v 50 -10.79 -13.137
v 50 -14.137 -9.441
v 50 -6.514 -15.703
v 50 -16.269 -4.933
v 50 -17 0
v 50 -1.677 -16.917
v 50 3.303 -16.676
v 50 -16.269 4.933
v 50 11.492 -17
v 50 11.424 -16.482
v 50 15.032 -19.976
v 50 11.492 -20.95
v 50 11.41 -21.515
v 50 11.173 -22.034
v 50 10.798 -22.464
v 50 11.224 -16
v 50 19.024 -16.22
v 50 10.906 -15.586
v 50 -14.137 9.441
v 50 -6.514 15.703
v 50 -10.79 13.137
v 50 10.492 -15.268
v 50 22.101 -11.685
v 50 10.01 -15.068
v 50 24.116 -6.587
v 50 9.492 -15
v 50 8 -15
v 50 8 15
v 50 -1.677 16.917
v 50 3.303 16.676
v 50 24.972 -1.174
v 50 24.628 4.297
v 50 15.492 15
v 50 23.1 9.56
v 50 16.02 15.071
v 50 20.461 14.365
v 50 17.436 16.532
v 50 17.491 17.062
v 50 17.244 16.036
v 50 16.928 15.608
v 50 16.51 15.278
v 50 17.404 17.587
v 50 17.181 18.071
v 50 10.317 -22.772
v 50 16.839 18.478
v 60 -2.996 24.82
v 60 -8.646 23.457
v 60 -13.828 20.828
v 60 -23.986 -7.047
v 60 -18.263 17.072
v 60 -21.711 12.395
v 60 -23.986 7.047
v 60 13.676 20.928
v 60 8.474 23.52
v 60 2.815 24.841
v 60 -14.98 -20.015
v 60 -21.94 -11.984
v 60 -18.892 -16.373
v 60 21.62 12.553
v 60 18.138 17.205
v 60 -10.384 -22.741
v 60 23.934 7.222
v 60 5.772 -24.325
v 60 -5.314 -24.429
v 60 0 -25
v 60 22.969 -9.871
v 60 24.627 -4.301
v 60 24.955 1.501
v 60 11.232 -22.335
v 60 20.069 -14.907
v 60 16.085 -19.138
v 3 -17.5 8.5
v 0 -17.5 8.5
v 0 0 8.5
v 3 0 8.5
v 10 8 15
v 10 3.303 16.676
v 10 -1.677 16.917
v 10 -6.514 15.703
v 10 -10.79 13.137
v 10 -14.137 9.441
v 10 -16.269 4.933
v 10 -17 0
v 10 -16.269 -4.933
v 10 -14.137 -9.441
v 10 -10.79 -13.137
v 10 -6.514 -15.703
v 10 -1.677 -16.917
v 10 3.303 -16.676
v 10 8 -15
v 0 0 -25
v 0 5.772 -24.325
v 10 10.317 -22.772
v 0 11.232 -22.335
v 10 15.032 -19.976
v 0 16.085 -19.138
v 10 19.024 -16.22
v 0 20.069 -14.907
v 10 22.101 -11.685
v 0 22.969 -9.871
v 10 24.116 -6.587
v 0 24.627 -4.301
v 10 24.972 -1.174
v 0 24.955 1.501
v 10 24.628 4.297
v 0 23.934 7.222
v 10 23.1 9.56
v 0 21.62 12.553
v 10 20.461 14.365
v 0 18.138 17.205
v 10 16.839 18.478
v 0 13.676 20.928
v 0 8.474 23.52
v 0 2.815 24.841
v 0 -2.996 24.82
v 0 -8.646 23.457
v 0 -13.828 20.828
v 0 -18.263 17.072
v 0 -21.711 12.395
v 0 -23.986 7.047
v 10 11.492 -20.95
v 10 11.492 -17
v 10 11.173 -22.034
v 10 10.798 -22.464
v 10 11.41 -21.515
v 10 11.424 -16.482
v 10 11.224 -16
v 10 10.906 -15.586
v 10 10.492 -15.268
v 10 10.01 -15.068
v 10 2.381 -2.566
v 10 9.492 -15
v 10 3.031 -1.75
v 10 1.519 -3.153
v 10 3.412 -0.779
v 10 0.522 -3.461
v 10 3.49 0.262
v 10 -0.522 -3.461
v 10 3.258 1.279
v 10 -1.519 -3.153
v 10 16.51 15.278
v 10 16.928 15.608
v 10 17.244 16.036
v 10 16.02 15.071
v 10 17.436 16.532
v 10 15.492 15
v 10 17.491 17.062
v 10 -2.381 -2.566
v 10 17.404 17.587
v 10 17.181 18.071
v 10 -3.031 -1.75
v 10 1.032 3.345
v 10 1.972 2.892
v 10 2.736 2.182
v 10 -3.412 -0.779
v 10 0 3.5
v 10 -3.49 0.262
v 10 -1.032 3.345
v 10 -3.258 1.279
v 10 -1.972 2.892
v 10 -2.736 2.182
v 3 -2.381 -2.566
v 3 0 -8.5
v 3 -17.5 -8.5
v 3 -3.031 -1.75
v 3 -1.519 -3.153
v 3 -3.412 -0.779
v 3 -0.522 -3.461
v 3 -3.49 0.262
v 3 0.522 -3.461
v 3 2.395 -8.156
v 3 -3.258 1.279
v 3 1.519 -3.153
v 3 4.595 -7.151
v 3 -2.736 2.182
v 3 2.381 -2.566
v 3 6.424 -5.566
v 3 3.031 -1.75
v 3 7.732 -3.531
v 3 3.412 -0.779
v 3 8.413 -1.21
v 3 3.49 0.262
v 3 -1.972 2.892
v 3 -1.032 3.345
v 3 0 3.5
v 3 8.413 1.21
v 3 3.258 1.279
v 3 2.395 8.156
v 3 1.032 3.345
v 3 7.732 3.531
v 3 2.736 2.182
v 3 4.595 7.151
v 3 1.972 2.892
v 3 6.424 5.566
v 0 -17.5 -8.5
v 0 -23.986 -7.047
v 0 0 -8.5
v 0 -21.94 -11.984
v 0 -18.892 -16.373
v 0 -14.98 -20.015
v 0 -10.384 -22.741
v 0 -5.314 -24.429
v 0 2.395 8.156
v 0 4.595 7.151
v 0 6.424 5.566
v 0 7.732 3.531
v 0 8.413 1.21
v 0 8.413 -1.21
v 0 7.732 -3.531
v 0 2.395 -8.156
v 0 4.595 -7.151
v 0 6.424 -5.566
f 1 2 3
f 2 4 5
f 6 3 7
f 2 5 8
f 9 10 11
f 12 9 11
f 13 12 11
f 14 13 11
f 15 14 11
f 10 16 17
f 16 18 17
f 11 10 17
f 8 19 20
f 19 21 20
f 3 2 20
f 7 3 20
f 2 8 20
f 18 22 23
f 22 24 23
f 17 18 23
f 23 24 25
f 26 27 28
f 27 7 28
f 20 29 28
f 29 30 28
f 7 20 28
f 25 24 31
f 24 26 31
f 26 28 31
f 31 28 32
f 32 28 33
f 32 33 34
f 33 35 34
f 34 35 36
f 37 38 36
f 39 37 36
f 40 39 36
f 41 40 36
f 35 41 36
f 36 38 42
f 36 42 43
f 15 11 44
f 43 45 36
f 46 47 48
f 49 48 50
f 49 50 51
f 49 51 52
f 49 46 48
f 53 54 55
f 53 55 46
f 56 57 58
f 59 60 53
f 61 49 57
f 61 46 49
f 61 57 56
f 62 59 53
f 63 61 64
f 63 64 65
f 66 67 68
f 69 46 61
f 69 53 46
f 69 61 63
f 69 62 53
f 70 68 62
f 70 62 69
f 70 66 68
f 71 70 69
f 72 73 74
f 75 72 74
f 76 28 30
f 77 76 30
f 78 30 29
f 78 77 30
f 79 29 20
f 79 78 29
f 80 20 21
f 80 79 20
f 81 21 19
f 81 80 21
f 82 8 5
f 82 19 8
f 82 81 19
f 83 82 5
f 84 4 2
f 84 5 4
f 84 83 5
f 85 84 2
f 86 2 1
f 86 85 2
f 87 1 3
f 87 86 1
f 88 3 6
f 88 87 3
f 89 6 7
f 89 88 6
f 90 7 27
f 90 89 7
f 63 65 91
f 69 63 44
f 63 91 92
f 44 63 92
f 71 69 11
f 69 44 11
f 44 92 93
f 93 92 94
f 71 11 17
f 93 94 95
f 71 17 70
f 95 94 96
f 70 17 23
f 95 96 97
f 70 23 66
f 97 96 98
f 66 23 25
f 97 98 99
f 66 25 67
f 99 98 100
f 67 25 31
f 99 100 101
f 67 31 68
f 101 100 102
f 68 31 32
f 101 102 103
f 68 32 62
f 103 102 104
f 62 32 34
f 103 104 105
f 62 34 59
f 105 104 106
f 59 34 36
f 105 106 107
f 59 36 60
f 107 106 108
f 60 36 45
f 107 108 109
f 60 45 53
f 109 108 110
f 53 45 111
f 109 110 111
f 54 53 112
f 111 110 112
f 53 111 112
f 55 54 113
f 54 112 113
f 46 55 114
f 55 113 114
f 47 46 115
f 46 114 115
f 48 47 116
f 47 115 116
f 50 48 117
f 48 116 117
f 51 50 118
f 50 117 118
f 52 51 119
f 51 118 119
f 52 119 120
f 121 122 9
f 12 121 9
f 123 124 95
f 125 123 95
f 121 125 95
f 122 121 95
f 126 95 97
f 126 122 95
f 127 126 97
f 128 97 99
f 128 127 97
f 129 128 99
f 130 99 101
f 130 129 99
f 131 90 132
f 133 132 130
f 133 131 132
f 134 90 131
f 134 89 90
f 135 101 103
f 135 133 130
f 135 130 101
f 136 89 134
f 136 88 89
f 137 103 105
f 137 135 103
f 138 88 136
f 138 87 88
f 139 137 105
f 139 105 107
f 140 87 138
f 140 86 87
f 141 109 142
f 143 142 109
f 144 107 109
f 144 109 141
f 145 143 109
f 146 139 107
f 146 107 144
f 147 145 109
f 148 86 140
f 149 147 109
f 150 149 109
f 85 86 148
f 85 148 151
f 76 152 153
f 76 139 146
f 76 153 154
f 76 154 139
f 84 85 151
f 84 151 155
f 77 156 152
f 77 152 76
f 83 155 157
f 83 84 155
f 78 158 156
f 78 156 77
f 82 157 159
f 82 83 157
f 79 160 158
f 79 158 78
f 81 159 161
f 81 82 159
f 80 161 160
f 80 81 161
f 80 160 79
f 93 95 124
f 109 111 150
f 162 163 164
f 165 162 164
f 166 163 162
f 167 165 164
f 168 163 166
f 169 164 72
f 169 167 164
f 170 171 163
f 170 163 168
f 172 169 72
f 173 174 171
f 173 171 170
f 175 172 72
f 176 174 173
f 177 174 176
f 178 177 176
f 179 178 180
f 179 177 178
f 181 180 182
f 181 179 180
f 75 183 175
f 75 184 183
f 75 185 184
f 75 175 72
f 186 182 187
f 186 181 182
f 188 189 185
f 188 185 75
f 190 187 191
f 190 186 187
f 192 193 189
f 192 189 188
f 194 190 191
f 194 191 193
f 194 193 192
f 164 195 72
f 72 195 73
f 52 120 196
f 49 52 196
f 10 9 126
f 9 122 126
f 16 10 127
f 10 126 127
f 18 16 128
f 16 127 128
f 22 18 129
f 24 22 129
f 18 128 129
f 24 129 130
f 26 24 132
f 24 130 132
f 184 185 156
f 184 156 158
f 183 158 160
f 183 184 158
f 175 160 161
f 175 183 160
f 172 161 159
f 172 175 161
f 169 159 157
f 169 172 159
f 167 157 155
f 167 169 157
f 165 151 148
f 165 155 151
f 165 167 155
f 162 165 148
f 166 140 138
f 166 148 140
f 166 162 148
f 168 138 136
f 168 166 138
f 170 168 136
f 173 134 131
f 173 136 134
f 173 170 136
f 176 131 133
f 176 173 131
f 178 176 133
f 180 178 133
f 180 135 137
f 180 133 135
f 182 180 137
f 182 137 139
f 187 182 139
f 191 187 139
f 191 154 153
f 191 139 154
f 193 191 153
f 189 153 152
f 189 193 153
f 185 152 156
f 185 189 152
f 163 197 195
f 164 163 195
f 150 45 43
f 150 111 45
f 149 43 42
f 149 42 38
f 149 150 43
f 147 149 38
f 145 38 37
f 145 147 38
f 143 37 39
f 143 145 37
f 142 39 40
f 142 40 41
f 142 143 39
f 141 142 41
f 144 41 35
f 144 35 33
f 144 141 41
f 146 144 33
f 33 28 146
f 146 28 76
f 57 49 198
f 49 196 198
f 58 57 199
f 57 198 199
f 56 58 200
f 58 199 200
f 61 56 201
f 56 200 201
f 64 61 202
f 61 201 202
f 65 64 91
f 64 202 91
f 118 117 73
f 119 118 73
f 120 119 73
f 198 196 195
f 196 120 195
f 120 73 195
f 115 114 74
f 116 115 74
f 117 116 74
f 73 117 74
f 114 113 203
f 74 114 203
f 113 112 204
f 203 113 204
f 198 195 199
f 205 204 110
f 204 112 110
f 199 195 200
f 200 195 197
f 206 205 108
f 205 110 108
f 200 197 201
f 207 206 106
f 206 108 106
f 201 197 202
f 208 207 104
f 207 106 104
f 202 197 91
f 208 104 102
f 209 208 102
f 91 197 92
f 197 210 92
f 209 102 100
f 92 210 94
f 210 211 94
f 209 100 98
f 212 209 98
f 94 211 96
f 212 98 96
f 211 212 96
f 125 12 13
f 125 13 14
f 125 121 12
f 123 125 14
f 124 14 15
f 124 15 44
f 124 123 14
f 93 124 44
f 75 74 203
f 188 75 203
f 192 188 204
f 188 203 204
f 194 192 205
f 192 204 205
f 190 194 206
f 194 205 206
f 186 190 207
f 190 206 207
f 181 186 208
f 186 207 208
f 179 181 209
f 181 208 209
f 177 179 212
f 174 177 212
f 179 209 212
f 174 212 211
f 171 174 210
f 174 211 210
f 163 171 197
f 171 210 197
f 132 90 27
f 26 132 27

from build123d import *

# Parameters (mm, degrees)
SKETCH2_R               = 25
BOSS_EXTRUDE1_DEPTH     = 60
CUT_EXTRUDE3_DEPTH      = 30
CUT_EXTRUDE4_DEPTH      = 20
CUT_EXTRUDE4_DEPTH_BACK = 20
SKETCH5_R               = 17
FILLET3_R               = 2
SKETCH6_R               = 3.5
CUT_EXTRUDE5_DEPTH      = 20
CUT_EXTRUDE7_DEPTH      = 3
CUT_EXTRUDE8_DEPTH      = 70.641941386
SKETCH9_W               = 40
SKETCH9_H               = 6
CUT_EXTRUDE9_DEPTH      = 30
FILLET5_R               = 2


with BuildPart() as part:
    # Sketch2 → Boss-Extrude1 (new body)
    with BuildSketch(Plane(origin=(0, 0, 0), x_dir=(0, 0, -1), z_dir=(1, 0, 0))):
        Circle(SKETCH2_R)
    extrude(amount=BOSS_EXTRUDE1_DEPTH)

    # Sketch4 → Cut-Extrude3 (cut)
    with BuildSketch(Plane(origin=(0, 0, 0), x_dir=(1, 0, 0), z_dir=(0, 1, 0))):
        Polygon((10, 0), (10, 15), (50, 15), (50, -15), (10, -15), align=None)
    extrude(amount=CUT_EXTRUDE3_DEPTH, mode=Mode.SUBTRACT)

    # Sketch5 → Cut-Extrude4 (cut, two sides: drawn at the far end of the back side and taken through both)
    with BuildSketch(Plane(origin=(30, 0, 0), x_dir=(0, 0, -1), z_dir=(1, 0, 0)).offset(-CUT_EXTRUDE4_DEPTH_BACK)):
        Circle(SKETCH5_R)
    extrude(amount=CUT_EXTRUDE4_DEPTH + CUT_EXTRUDE4_DEPTH_BACK, mode=Mode.SUBTRACT)

    # Fillet3
    fillet3_edges = [part.edges().sort_by_distance(p)[0] for p in [
        (30, 20, -15),
        (30, 20, 15),
    ]]
    fillet(fillet3_edges, radius=FILLET3_R)

    # Sketch6 → Cut-Extrude5 (cut)
    with BuildSketch(Plane(origin=(0, 0, 0), x_dir=(0, 0, -1), z_dir=(1, 0, 0))):
        with Locations(Location((0, 0, 0), (0, 0, 180))):
            Circle(SKETCH6_R)
    extrude(amount=CUT_EXTRUDE5_DEPTH, mode=Mode.SUBTRACT)

    # Sketch7 → Cut-Extrude7 (cut)
    with BuildSketch(Plane(origin=(0, 0, 0), x_dir=(0, 0, -1), z_dir=(1, 0, 0))):
        with BuildLine():
            Line((-8.5, -0.449954403), (-8.5, 0))
            ThreePointArc((-8.5, 0), (0, 8.5), (8.5, 0))
            Line((8.5, 0), (8.5, -17.5))
            Line((8.5, -17.5), (-8.5, -17.5))
            Line((-8.5, -17.5), (-8.5, -0.449954403))
        make_face()
    extrude(amount=CUT_EXTRUDE7_DEPTH, mode=Mode.SUBTRACT)

    # Sketch8 → Cut-Extrude8 (cut, through all)
    with BuildSketch(Plane(origin=(0, 0, 0), x_dir=(0, 0, -1), z_dir=(1, 0, 0))):
        Polygon((0, -25), (-19.612673496, -25), (-19.612673496, -23.986231348), (13.394020924, -23.986231348), (13.394020924, -25), align=None)
    extrude(amount=CUT_EXTRUDE8_DEPTH, mode=Mode.SUBTRACT)

    # Sketch9 → Cut-Extrude9 (cut)
    with BuildSketch(Plane.XY):
        with Locations((30, 14.491933385)):
            Rectangle(SKETCH9_W, SKETCH9_H)
    extrude(amount=-CUT_EXTRUDE9_DEPTH, mode=Mode.SUBTRACT)

    # Fillet5
    fillet5_edges = [part.edges().sort_by_distance(p)[0] for p in [
        (30, 11.491933385, -15),
        (30, 11.491933385, -22.202150055),
    ]]
    fillet(fillet5_edges, radius=FILLET5_R)


solid = part.part
